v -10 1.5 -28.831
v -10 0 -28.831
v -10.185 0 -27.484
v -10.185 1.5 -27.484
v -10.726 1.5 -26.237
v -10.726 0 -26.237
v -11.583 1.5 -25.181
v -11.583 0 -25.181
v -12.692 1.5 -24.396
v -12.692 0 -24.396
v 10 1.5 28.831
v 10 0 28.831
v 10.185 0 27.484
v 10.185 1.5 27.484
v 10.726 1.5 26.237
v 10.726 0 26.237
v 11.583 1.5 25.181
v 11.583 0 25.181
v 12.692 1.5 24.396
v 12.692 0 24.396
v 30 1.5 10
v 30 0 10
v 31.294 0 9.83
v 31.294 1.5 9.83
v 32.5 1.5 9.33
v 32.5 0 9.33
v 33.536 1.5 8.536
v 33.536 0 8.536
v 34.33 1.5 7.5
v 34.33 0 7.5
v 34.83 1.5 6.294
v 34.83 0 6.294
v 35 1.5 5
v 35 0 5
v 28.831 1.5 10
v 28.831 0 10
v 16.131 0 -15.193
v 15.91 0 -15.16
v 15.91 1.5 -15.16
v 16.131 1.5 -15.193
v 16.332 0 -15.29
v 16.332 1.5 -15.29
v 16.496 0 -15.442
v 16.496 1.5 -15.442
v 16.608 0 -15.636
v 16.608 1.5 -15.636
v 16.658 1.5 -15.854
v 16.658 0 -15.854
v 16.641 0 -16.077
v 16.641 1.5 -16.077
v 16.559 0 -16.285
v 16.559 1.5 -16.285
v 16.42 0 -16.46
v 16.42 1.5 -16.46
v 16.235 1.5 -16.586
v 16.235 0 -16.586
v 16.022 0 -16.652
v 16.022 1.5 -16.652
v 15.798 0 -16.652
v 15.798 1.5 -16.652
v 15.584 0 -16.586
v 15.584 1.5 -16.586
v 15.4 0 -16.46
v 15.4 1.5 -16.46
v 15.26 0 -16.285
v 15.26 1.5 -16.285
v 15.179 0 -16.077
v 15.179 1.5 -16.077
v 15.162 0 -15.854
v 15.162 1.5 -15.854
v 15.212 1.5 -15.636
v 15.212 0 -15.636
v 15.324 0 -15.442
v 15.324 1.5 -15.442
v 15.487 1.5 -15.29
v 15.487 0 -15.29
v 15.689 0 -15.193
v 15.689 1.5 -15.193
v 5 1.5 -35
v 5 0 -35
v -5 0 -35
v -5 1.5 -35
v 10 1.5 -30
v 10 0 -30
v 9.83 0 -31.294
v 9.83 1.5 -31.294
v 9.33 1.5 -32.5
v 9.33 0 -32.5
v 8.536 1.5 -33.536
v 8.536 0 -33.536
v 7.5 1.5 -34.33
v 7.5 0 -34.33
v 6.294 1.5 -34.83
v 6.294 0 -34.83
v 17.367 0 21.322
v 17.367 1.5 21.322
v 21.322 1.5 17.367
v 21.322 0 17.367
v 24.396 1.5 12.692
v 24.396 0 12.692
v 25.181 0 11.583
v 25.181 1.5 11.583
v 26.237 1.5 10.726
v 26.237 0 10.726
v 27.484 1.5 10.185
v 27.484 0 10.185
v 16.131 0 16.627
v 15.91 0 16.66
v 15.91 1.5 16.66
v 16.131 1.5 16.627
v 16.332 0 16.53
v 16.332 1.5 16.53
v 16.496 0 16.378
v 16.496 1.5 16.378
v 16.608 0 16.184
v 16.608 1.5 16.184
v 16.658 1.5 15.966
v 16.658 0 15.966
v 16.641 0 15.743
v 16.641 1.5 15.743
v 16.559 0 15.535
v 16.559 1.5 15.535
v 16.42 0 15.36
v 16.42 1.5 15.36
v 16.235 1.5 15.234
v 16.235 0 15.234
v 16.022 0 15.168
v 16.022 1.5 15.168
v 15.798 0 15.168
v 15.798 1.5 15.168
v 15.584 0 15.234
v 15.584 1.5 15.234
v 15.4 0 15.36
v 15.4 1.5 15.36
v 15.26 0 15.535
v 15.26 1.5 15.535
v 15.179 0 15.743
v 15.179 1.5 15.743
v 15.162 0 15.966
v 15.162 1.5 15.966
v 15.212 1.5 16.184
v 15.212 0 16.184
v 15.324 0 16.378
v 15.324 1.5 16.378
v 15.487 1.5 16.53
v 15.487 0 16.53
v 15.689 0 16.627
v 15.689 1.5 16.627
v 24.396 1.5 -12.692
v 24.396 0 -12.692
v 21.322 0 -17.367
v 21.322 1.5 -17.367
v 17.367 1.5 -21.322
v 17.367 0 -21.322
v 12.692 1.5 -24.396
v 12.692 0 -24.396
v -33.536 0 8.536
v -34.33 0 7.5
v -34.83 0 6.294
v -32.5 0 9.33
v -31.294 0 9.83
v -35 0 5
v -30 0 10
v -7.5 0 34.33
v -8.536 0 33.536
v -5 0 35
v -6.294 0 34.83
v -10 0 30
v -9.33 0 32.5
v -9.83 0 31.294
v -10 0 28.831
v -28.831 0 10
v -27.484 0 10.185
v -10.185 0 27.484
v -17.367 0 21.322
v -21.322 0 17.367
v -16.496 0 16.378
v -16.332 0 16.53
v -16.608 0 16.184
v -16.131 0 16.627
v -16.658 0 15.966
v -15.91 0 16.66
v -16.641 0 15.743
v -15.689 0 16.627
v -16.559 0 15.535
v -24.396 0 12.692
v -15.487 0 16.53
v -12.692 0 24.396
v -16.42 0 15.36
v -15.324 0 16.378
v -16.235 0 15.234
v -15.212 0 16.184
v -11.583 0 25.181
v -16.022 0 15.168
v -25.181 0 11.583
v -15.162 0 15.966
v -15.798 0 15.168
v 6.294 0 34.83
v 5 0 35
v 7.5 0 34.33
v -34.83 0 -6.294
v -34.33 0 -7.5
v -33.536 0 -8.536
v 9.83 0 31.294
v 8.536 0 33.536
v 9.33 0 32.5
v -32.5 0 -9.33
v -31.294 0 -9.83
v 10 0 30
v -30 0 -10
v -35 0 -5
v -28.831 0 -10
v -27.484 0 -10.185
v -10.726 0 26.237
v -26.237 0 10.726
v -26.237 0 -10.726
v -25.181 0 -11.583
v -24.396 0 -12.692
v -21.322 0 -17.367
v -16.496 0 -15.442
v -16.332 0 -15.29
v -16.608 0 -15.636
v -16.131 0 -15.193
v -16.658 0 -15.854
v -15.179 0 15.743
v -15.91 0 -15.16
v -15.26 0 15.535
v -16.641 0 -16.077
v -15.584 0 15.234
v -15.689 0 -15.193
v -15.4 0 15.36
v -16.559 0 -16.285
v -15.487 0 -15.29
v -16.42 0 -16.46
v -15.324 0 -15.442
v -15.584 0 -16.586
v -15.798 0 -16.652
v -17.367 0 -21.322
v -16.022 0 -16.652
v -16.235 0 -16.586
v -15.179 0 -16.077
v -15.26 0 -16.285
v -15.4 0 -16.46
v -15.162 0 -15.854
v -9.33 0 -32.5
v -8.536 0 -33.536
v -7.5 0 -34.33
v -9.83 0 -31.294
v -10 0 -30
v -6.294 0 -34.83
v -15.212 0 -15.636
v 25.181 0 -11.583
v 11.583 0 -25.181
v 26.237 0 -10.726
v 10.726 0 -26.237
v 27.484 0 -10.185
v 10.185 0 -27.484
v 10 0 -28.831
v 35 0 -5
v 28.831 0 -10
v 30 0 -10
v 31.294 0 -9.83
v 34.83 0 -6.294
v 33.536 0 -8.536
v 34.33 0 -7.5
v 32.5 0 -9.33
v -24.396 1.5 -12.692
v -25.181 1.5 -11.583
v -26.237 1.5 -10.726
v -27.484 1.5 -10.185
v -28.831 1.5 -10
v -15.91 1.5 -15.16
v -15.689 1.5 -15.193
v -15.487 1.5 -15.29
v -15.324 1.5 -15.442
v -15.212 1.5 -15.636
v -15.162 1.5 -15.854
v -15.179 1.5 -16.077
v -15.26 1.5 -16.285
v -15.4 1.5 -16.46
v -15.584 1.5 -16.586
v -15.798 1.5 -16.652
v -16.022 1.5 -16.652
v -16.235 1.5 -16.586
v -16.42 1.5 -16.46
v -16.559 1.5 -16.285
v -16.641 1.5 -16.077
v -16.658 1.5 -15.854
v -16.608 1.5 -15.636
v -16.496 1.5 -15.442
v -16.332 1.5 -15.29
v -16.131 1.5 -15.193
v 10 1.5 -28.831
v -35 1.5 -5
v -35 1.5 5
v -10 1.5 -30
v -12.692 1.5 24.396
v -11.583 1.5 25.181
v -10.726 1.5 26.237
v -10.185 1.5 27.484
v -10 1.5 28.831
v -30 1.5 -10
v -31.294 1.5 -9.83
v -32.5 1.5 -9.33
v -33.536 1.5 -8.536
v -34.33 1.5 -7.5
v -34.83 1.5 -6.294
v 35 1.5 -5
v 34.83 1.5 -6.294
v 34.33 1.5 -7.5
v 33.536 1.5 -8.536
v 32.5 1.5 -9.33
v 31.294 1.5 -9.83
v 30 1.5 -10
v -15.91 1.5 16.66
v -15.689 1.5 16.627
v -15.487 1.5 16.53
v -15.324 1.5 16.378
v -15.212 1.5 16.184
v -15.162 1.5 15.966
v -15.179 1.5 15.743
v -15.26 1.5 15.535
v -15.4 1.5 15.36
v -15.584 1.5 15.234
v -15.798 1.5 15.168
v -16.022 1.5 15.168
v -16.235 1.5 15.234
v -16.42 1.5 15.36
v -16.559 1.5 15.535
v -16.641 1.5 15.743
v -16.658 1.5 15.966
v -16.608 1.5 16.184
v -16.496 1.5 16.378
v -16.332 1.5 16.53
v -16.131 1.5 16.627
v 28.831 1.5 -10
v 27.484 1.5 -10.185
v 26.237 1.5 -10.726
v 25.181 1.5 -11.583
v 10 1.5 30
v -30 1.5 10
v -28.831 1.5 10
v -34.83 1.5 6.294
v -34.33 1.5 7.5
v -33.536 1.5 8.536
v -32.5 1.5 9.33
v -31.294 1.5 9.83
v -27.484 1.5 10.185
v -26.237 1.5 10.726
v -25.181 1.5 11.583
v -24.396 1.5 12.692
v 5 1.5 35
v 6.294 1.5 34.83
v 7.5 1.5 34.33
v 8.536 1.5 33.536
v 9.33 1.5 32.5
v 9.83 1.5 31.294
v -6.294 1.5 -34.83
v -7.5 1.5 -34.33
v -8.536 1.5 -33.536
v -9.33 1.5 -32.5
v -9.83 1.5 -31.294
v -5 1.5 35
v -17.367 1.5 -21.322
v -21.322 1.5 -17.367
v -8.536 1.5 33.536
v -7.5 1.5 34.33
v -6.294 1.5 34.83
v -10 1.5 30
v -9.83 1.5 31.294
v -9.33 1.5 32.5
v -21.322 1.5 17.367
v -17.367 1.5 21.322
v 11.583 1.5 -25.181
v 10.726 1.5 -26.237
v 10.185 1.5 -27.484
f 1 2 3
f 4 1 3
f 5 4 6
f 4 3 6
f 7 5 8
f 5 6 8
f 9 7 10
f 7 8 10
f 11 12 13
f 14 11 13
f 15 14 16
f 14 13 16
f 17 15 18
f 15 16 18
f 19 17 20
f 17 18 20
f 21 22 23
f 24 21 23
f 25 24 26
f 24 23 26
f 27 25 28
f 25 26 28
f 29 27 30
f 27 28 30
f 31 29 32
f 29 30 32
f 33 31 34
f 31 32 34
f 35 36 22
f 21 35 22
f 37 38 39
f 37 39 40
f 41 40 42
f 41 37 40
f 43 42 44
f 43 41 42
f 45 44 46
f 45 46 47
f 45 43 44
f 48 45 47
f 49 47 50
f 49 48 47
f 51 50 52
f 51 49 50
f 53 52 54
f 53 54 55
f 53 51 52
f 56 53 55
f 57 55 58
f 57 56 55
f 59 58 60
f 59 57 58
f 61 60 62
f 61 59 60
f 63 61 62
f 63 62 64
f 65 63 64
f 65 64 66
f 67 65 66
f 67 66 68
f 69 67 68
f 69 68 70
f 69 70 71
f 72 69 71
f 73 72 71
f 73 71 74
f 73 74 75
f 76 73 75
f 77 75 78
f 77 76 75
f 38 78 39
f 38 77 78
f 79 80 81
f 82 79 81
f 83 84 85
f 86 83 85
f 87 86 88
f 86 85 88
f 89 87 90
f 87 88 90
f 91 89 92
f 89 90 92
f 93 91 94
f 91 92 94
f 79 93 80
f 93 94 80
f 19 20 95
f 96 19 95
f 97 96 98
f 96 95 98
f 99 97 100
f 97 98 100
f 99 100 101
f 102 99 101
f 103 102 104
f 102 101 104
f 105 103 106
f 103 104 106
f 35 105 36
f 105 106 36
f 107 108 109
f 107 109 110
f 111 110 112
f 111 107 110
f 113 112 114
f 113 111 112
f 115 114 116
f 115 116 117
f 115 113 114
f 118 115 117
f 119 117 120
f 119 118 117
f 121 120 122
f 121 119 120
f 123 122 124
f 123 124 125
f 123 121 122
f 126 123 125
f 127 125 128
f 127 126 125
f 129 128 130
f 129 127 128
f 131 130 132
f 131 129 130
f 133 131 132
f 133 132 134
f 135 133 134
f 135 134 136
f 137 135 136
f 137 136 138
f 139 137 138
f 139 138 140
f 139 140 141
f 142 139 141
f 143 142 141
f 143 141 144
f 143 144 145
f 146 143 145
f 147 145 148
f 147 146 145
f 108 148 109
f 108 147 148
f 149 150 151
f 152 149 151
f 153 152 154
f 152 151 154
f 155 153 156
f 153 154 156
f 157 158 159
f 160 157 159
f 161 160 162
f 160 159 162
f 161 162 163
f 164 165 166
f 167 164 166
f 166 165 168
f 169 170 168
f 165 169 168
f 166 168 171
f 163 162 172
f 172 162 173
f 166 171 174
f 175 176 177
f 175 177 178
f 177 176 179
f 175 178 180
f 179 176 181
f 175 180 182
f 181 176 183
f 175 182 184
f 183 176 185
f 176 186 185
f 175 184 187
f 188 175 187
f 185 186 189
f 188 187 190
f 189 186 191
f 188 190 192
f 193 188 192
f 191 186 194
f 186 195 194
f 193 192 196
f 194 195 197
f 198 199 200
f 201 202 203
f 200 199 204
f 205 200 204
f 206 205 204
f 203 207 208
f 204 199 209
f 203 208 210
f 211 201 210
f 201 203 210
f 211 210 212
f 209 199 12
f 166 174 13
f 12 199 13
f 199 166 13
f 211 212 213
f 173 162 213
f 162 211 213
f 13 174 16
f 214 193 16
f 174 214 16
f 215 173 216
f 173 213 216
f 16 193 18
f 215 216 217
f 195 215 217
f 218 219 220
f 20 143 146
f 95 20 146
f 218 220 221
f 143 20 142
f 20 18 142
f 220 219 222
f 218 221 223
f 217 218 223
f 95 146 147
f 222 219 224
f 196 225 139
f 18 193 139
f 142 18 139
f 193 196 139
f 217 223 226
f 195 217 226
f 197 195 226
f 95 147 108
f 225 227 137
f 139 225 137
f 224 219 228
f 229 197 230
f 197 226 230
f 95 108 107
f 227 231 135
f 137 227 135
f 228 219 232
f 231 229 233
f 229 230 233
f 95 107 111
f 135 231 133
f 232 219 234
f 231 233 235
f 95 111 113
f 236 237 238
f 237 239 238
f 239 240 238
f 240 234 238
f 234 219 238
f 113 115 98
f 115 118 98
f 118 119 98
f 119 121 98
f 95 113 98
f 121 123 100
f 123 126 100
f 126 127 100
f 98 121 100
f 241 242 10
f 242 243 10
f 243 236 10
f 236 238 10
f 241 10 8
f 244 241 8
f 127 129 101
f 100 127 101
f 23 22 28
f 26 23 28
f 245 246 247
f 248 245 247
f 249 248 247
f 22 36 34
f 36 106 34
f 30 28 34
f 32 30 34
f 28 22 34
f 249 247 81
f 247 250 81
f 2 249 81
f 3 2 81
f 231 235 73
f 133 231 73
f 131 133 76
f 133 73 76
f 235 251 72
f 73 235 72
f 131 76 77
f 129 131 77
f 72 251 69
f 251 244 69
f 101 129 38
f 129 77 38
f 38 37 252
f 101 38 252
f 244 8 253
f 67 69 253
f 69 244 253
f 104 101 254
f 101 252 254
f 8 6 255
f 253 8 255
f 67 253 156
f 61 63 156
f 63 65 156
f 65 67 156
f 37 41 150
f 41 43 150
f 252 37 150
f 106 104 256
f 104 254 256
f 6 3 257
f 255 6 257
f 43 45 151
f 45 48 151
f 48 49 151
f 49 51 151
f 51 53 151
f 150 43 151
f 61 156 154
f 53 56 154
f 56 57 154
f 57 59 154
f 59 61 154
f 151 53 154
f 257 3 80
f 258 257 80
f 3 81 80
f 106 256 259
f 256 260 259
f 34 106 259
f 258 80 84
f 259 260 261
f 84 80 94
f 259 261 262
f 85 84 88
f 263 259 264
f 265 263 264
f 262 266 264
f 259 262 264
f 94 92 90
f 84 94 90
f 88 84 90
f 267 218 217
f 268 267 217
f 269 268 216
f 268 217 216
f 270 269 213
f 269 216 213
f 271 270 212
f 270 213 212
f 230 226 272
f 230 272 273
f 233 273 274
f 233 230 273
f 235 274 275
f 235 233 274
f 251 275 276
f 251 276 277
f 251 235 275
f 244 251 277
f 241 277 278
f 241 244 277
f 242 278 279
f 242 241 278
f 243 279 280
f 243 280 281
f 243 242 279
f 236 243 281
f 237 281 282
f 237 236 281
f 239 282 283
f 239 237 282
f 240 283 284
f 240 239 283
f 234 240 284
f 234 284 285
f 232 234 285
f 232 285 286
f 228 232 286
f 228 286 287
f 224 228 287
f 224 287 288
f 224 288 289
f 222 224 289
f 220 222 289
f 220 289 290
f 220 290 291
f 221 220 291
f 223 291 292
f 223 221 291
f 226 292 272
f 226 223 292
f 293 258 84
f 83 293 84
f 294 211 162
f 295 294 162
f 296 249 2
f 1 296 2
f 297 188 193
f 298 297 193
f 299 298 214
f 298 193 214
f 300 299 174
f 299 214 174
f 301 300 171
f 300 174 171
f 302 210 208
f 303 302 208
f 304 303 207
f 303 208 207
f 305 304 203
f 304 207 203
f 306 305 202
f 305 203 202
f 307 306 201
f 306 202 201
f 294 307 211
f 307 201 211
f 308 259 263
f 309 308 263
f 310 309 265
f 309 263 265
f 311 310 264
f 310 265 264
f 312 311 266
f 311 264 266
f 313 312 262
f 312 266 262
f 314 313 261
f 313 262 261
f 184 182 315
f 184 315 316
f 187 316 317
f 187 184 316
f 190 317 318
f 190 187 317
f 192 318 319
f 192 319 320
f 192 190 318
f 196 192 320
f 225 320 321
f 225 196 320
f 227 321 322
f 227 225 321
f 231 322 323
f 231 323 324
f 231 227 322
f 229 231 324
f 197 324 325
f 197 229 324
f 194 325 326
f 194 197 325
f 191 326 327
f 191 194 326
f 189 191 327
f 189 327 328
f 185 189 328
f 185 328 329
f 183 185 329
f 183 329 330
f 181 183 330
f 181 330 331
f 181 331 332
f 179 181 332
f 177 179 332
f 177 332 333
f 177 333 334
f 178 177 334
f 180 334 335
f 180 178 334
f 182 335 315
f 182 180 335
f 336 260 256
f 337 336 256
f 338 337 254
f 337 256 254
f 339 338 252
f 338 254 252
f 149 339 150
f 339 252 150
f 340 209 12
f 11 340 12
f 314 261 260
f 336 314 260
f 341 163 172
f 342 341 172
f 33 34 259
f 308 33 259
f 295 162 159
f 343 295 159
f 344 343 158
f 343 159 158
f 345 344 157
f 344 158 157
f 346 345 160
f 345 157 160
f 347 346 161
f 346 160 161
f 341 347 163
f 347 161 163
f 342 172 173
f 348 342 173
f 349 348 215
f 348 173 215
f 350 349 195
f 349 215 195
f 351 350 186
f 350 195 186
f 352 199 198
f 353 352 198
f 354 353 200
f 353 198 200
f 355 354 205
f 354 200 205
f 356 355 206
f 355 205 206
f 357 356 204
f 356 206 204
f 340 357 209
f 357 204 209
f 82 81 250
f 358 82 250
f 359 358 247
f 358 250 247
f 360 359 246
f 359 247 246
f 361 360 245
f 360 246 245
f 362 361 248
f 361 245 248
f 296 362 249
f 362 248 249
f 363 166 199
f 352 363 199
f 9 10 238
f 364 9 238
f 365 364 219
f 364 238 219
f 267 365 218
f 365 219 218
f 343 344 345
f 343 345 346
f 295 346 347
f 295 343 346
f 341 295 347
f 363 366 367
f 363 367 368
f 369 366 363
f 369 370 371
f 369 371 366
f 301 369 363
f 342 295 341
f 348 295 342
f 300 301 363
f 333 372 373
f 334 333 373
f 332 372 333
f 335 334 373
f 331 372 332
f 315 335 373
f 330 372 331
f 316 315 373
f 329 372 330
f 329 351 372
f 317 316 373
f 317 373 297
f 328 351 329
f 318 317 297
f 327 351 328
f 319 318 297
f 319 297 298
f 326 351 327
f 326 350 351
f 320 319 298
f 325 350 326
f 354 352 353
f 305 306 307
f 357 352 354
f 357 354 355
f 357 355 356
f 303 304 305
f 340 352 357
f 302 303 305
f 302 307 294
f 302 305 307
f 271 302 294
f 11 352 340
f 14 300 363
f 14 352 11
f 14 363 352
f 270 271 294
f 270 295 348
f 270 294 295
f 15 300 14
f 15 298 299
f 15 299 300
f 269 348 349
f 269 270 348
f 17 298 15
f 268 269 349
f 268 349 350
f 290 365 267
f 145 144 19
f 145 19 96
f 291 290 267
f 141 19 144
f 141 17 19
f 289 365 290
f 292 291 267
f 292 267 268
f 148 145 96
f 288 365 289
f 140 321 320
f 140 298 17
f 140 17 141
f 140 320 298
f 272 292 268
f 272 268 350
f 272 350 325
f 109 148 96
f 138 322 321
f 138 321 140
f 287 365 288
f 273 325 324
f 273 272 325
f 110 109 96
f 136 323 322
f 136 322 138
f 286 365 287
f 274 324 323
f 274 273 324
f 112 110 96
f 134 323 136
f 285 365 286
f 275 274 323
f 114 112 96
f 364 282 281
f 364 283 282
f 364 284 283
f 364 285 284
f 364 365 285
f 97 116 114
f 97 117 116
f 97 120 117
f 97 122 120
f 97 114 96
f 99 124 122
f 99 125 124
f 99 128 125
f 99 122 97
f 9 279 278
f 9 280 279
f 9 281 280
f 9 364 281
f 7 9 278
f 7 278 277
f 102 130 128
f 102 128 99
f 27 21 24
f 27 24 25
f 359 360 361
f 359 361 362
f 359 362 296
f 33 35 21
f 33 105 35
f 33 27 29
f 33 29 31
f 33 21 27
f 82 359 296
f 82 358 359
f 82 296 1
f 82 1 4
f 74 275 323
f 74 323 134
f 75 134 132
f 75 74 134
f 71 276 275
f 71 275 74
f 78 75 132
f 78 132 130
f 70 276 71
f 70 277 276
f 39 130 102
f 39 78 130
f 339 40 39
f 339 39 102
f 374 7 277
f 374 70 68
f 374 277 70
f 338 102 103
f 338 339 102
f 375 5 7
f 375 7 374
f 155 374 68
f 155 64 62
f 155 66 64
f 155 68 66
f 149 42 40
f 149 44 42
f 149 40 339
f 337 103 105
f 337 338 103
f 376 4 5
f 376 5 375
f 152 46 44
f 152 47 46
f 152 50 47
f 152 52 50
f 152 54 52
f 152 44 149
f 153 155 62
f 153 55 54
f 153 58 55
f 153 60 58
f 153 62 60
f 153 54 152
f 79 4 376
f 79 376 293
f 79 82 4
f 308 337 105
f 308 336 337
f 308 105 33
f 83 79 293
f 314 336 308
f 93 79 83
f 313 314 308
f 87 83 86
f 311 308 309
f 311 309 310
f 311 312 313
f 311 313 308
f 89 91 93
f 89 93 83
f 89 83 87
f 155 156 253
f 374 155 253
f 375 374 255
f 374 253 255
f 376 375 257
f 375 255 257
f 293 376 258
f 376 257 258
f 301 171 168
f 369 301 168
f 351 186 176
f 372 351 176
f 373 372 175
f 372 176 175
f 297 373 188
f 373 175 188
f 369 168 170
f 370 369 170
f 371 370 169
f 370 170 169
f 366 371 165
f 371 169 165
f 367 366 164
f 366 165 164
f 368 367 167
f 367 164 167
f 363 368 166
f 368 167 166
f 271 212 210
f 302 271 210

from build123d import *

# Parameters (mm, degrees)
SKETCH_1_R      = 0.75
EXTRUDE_2_DEPTH = 1.5


with BuildPart() as part:
    # 草图1 → 凸台-拉伸2 (new body)
    with BuildSketch(Plane(origin=(0, 0, 0), x_dir=(1, 0, 0), z_dir=(0, 1, 0))):
        with BuildLine():
            Line((28.831406487, -10), (30, -10))
            ThreePointArc((30, -10), (33.535533906, -8.535533906), (35, -5))
            Line((35, -5), (35, 0))
            Line((35, 0), (35, 5))
            ThreePointArc((35, 5), (33.535533906, 8.535533906), (30, 10))
            Line((30, 10), (28.831406487, 10))
            ThreePointArc((28.831406487, 10), (26.237033878, 10.725747929), (24.395805489, 12.692307692))
            ThreePointArc((24.395805489, 12.692307692), (19.445436483, 19.445436483), (12.692307692, 24.395805489))
            ThreePointArc((12.692307692, 24.395805489), (10.725747929, 26.237033878), (10, 28.831406487))
            Line((10, 28.831406487), (10, 30))
            ThreePointArc((10, 30), (8.535533906, 33.535533906), (5, 35))
            Line((5, 35), (0, 35))
            Line((0, 35), (-5, 35))
            ThreePointArc((-5, 35), (-8.535533906, 33.535533906), (-10, 30))
            Line((-10, 30), (-10, 28.831406487))
            ThreePointArc((-10, 28.831406487), (-10.725747929, 26.237033878), (-12.692307692, 24.395805489))
            ThreePointArc((-12.692307692, 24.395805489), (-19.445436483, 19.445436483), (-24.395805489, 12.692307692))
            ThreePointArc((-24.395805489, 12.692307692), (-26.237033878, 10.725747929), (-28.831406487, 10))
            Line((-28.831406487, 10), (-30, 10))
            ThreePointArc((-30, 10), (-33.535533906, 8.535533906), (-35, 5))
            Line((-35, 5), (-35, 0))
            Line((-35, 0), (-35, -5))
            ThreePointArc((-35, -5), (-33.535533906, -8.535533906), (-30, -10))
            Line((-30, -10), (-28.831406487, -10))
            ThreePointArc((-28.831406487, -10), (-26.237033878, -10.725747929), (-24.395805489, -12.692307692))
            ThreePointArc((-24.395805489, -12.692307692), (-19.445436483, -19.445436483), (-12.692307692, -24.395805489))
            ThreePointArc((-12.692307692, -24.395805489), (-10.725747929, -26.237033878), (-10, -28.831406487))
            Line((-10, -28.831406487), (-10, -30))
            ThreePointArc((-10, -30), (-8.535533906, -33.535533906), (-5, -35))
            Line((-5, -35), (0, -35))
            Line((0, -35), (5, -35))
            ThreePointArc((5, -35), (8.535533906, -33.535533906), (10, -30))
            Line((10, -30), (10, -28.831406487))
            ThreePointArc((10, -28.831406487), (10.725747929, -26.237033878), (12.692307692, -24.395805489))
            ThreePointArc((12.692307692, -24.395805489), (19.445436483, -19.445436483), (24.395805489, -12.692307692))
            ThreePointArc((24.395805489, -12.692307692), (26.237033878, -10.725747929), (28.831406487, -10))
        make_face()
        with Locations(Location((15.909902577, -15.909902577, 0), (0, 0, 270))):
            Circle(SKETCH_1_R, mode=Mode.SUBTRACT)
        with Locations(Location((-15.909902577, -15.909902577, 0), (0, 0, 270))):
            Circle(SKETCH_1_R, mode=Mode.SUBTRACT)
        with Locations(Location((-15.909902577, 15.909902577, 0), (0, 0, 270))):
            Circle(SKETCH_1_R, mode=Mode.SUBTRACT)
        with Locations(Location((15.909902577, 15.909902577, 0), (0, 0, 270))):
            Circle(SKETCH_1_R, mode=Mode.SUBTRACT)
    extrude(amount=EXTRUDE_2_DEPTH)


solid = part.part
